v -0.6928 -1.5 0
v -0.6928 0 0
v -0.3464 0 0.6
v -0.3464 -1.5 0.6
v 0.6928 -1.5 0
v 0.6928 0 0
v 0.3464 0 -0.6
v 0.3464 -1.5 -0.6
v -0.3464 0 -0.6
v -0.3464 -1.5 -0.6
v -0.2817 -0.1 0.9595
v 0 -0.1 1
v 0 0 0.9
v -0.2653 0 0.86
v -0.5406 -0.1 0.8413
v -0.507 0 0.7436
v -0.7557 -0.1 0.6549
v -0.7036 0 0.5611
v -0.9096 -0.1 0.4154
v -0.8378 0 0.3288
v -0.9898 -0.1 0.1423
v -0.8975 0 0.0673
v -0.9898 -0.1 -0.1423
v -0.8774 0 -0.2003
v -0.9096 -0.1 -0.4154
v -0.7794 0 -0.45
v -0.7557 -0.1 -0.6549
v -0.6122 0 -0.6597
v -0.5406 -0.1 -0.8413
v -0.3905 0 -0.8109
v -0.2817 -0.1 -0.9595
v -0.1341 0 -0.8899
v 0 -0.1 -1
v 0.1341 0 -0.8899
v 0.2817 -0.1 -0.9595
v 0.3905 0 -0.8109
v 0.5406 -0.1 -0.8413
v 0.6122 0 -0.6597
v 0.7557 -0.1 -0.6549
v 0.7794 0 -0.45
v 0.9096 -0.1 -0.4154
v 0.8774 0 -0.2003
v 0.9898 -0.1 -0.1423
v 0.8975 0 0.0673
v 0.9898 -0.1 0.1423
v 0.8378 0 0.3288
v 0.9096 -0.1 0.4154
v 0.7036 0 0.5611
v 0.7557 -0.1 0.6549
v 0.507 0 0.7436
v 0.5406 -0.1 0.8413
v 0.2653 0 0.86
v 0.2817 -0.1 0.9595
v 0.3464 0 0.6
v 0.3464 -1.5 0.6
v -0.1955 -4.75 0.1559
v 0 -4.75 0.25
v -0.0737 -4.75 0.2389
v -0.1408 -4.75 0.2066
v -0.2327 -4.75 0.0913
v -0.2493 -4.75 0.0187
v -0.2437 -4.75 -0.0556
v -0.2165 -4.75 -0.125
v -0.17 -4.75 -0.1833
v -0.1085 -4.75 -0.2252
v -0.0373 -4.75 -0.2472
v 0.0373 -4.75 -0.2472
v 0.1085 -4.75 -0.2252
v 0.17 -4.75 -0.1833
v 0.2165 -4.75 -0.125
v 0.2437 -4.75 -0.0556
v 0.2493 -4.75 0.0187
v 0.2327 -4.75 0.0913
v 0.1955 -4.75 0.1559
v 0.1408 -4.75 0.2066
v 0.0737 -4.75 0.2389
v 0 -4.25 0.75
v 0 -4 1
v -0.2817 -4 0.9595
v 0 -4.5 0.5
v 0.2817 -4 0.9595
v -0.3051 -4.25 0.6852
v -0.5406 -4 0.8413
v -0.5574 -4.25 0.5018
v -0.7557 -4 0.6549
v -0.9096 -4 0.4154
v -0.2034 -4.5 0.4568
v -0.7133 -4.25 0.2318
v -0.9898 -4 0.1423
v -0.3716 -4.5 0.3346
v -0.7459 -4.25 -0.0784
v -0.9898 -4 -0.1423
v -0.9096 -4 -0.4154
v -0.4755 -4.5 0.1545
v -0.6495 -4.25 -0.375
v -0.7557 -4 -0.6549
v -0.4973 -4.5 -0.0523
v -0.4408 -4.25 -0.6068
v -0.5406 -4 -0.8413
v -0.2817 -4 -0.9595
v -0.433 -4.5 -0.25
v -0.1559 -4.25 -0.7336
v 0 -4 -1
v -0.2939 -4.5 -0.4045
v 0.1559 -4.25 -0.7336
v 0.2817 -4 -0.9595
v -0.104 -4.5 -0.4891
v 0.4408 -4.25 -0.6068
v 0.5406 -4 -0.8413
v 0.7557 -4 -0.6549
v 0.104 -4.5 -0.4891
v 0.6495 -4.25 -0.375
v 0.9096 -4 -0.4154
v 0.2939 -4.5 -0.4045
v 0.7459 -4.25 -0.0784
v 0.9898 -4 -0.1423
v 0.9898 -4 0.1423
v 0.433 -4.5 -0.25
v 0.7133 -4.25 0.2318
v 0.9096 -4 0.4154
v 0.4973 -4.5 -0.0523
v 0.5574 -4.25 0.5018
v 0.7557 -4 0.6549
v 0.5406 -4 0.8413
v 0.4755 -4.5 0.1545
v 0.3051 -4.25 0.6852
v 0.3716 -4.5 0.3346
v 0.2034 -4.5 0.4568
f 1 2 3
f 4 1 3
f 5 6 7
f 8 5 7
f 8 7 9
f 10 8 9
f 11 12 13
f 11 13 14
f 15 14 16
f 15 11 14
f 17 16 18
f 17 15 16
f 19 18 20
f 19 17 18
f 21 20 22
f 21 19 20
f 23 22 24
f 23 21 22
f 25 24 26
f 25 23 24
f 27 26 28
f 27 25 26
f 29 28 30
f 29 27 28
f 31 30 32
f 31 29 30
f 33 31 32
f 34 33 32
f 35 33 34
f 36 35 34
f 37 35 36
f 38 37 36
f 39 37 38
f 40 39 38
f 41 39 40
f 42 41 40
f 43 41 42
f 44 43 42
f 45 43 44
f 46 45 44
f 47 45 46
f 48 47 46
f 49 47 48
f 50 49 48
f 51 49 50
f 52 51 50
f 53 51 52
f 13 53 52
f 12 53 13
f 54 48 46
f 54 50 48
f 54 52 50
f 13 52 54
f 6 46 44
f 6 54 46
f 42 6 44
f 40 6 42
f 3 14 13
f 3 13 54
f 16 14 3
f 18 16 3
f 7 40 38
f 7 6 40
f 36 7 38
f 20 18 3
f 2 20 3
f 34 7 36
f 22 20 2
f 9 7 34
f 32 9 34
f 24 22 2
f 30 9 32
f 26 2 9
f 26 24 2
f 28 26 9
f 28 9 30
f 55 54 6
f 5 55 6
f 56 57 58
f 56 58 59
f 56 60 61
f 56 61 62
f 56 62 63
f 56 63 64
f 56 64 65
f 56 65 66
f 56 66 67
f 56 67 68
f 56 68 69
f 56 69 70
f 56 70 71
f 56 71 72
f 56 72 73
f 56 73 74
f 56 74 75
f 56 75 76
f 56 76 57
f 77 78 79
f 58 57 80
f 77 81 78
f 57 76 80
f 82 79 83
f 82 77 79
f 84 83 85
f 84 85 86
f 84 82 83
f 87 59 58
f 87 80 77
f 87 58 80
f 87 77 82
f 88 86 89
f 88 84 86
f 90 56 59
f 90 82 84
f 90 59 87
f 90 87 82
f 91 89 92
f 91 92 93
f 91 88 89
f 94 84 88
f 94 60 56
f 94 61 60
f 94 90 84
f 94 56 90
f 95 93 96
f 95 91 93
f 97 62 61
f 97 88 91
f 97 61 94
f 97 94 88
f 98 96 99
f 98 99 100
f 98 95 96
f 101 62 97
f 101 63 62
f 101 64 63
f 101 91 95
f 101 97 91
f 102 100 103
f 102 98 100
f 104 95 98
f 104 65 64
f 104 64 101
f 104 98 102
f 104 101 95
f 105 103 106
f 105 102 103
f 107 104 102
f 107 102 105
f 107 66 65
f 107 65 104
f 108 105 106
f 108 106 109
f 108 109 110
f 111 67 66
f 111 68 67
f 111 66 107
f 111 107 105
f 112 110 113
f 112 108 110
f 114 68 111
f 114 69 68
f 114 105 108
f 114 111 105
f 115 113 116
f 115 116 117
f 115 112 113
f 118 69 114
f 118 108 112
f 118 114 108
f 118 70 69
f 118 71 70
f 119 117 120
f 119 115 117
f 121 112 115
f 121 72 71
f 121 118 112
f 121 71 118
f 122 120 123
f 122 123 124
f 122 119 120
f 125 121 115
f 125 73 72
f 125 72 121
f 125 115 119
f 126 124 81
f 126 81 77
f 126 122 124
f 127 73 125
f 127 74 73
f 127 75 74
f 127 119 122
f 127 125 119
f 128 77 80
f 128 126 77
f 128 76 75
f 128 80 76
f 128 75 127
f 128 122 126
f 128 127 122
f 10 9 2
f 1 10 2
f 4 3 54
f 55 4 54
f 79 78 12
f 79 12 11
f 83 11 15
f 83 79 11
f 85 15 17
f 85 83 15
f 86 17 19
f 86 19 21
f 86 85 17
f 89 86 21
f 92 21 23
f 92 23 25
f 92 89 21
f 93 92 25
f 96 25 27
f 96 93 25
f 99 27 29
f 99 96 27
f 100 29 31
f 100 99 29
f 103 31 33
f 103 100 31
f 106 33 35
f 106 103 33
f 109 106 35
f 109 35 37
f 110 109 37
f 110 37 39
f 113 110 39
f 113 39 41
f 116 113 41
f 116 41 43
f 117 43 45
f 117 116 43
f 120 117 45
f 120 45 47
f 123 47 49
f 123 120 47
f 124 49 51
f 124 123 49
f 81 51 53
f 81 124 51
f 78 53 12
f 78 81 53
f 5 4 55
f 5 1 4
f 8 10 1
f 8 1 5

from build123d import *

# Parameters (mm, degrees)
CUT_EXTRUDE_1_DEPTH = 1.5
CHAMFER_1_SIZE      = 0.1


with BuildPart() as part:
    # 草图1 → 旋转1 (revolve)
    with BuildSketch(Plane.XY, mode=Mode.PRIVATE) as revolve_1_sk:
        Polygon((0, 0), (1, 0), (1, -4), (0.25, -4.75), (0, -4.75), align=None)
    revolve(revolve_1_sk.sketch.rotate(Axis((0, 8.713500289, 0), (0, -1, 0)), 90), axis=Axis((0, 8.713500289, 0), (0, -1, 0)))

    # 草图2 → 切除-拉伸1 (cut)
    with BuildSketch(Plane(origin=(0, 0, 0), x_dir=(1, 0, 0), z_dir=(0, 1, 0))):
        Polygon((-0.346410162, -0.6), (0.346410162, -0.6), (0.692820323, 0), (0.346410162, 0.6), (-0.346410162, 0.6), (-0.692820323, 0), align=None)
    extrude(amount=-CUT_EXTRUDE_1_DEPTH, mode=Mode.SUBTRACT)

    # 倒角1
    chamfer_1_edges = [part.edges().sort_by_distance(p)[0] for p in [
        (0, 0, -1),
    ]]
    chamfer(chamfer_1_edges, length=CHAMFER_1_SIZE)


solid = part.part
